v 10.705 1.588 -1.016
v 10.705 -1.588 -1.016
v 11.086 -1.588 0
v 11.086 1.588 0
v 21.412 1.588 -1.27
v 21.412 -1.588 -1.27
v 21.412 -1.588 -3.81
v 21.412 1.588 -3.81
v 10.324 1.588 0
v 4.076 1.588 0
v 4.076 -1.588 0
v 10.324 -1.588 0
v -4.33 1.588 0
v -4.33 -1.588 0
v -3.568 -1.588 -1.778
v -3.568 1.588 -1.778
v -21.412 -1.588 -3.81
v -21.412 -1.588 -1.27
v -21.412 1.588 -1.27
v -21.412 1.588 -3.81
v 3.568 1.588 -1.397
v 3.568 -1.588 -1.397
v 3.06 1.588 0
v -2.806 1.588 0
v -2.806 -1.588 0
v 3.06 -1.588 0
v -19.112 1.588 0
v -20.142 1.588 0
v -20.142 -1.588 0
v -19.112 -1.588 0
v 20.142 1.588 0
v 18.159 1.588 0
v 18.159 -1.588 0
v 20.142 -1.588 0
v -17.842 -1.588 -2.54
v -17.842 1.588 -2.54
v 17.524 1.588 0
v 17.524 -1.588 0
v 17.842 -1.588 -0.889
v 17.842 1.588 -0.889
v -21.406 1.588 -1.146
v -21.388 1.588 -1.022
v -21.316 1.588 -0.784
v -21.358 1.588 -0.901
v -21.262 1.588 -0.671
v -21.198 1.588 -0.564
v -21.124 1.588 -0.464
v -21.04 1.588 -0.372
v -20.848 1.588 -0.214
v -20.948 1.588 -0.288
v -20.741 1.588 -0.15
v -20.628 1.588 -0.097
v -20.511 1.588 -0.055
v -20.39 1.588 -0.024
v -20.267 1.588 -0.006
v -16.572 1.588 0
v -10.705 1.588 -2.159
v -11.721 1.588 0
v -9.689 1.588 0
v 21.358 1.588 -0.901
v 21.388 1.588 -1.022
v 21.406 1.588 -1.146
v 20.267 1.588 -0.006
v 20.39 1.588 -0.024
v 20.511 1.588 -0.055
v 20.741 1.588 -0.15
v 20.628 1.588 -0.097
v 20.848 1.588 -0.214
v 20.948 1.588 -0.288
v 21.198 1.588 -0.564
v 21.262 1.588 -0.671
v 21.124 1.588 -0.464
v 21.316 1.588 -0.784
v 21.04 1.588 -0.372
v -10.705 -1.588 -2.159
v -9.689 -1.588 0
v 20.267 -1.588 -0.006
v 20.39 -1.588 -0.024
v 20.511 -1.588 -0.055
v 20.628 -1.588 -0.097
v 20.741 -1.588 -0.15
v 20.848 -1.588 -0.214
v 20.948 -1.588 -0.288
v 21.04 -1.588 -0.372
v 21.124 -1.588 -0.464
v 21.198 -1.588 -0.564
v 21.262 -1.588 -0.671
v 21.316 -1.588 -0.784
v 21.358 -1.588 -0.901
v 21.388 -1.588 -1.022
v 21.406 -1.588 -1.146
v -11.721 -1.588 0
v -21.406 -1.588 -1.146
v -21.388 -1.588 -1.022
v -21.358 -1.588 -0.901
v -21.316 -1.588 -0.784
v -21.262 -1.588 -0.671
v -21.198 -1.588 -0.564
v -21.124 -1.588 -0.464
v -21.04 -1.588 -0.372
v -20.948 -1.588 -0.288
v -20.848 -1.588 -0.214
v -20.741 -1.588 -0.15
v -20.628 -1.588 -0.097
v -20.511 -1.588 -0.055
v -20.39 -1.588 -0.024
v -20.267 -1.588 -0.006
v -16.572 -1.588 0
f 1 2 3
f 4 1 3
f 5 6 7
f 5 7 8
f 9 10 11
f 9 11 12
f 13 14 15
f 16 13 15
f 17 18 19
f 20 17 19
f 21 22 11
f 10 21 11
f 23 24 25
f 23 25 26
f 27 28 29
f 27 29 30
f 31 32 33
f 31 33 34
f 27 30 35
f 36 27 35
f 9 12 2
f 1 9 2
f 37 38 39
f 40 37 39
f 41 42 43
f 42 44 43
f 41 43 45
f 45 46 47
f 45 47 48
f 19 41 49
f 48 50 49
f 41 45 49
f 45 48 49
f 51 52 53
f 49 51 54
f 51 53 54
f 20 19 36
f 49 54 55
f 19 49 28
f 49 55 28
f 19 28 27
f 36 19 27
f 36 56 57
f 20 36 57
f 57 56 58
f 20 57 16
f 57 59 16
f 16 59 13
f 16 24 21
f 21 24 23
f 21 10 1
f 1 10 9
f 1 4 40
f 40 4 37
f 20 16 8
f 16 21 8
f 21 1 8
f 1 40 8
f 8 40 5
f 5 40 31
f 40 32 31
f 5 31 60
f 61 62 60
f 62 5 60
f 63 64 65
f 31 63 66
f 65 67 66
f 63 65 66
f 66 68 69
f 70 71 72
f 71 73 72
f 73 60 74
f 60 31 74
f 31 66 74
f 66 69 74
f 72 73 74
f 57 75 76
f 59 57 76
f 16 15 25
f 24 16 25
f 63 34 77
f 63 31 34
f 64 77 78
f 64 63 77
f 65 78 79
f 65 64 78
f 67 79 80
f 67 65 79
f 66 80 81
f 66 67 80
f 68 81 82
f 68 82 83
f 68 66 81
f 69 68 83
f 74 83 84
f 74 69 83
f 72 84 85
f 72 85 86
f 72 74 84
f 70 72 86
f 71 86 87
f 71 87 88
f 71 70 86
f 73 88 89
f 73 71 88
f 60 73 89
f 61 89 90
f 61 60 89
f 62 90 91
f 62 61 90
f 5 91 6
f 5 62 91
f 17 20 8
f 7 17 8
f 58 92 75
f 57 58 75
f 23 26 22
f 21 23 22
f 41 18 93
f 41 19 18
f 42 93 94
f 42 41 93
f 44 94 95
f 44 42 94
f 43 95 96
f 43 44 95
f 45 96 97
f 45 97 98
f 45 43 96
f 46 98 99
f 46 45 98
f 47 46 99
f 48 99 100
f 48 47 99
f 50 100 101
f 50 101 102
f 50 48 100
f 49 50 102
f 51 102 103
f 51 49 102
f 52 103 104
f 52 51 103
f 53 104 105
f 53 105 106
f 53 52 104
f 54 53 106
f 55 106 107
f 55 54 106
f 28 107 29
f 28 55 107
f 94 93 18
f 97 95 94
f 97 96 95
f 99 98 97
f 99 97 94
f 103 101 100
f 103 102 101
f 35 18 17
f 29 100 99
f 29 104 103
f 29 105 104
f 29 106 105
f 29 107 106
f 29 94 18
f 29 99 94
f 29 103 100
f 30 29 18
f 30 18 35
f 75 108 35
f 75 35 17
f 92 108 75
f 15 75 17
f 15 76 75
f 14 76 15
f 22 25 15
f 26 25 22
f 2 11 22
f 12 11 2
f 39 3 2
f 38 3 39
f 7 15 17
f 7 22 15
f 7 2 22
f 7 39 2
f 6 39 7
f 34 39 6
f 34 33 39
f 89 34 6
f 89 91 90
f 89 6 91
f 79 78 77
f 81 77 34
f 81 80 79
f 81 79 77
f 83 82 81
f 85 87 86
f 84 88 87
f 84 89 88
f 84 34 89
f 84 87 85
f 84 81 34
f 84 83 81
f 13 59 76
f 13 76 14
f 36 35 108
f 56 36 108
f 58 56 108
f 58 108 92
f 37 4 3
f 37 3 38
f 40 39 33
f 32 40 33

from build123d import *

# Parameters (mm, degrees)
F0_W     = 42.8244
F0_H     = 3.175
F1_DEPTH = 3.81
F3_DEPTH = 3.176
F4_R     = 1.27


with BuildPart() as f1:
    # F0 (on Top) → F1 (new body)
    with BuildSketch(Plane.XY):
        Rectangle(F0_W, F0_H)
    extrude(amount=-F1_DEPTH)

    # F2 (on face) → F3 (cut, through all)
    with BuildSketch(Plane.XZ.offset(1.5875)):
        Polygon((-16.571534, 0), (-19.111534, 0), (-17.841534, -2.54), align=None)
        Polygon((-9.688922, 0), (-11.720922, 0), (-10.704922, -2.159), align=None)
        Polygon((-2.806309, 0), (-4.330309, 0), (-3.568309, -1.778), align=None)
        Polygon((4.076304, 0), (3.060304, 0), (3.568304, -1.397), align=None)
        Polygon((10.704916, -1.016), (11.085916, 0), (10.323916, 0), align=None)
        Polygon((17.841529, -0.889), (18.159029, 0), (17.524029, 0), align=None)
    extrude(amount=-F3_DEPTH, mode=Mode.SUBTRACT)

    # F4
    f4_edges = [f1.edges().sort_by_distance(p)[0] for p in [
        (-21.4122, 0, 0),
        (21.4122, 0, 0),
    ]]
    fillet(f4_edges, radius=F4_R)


solid = f1.part
